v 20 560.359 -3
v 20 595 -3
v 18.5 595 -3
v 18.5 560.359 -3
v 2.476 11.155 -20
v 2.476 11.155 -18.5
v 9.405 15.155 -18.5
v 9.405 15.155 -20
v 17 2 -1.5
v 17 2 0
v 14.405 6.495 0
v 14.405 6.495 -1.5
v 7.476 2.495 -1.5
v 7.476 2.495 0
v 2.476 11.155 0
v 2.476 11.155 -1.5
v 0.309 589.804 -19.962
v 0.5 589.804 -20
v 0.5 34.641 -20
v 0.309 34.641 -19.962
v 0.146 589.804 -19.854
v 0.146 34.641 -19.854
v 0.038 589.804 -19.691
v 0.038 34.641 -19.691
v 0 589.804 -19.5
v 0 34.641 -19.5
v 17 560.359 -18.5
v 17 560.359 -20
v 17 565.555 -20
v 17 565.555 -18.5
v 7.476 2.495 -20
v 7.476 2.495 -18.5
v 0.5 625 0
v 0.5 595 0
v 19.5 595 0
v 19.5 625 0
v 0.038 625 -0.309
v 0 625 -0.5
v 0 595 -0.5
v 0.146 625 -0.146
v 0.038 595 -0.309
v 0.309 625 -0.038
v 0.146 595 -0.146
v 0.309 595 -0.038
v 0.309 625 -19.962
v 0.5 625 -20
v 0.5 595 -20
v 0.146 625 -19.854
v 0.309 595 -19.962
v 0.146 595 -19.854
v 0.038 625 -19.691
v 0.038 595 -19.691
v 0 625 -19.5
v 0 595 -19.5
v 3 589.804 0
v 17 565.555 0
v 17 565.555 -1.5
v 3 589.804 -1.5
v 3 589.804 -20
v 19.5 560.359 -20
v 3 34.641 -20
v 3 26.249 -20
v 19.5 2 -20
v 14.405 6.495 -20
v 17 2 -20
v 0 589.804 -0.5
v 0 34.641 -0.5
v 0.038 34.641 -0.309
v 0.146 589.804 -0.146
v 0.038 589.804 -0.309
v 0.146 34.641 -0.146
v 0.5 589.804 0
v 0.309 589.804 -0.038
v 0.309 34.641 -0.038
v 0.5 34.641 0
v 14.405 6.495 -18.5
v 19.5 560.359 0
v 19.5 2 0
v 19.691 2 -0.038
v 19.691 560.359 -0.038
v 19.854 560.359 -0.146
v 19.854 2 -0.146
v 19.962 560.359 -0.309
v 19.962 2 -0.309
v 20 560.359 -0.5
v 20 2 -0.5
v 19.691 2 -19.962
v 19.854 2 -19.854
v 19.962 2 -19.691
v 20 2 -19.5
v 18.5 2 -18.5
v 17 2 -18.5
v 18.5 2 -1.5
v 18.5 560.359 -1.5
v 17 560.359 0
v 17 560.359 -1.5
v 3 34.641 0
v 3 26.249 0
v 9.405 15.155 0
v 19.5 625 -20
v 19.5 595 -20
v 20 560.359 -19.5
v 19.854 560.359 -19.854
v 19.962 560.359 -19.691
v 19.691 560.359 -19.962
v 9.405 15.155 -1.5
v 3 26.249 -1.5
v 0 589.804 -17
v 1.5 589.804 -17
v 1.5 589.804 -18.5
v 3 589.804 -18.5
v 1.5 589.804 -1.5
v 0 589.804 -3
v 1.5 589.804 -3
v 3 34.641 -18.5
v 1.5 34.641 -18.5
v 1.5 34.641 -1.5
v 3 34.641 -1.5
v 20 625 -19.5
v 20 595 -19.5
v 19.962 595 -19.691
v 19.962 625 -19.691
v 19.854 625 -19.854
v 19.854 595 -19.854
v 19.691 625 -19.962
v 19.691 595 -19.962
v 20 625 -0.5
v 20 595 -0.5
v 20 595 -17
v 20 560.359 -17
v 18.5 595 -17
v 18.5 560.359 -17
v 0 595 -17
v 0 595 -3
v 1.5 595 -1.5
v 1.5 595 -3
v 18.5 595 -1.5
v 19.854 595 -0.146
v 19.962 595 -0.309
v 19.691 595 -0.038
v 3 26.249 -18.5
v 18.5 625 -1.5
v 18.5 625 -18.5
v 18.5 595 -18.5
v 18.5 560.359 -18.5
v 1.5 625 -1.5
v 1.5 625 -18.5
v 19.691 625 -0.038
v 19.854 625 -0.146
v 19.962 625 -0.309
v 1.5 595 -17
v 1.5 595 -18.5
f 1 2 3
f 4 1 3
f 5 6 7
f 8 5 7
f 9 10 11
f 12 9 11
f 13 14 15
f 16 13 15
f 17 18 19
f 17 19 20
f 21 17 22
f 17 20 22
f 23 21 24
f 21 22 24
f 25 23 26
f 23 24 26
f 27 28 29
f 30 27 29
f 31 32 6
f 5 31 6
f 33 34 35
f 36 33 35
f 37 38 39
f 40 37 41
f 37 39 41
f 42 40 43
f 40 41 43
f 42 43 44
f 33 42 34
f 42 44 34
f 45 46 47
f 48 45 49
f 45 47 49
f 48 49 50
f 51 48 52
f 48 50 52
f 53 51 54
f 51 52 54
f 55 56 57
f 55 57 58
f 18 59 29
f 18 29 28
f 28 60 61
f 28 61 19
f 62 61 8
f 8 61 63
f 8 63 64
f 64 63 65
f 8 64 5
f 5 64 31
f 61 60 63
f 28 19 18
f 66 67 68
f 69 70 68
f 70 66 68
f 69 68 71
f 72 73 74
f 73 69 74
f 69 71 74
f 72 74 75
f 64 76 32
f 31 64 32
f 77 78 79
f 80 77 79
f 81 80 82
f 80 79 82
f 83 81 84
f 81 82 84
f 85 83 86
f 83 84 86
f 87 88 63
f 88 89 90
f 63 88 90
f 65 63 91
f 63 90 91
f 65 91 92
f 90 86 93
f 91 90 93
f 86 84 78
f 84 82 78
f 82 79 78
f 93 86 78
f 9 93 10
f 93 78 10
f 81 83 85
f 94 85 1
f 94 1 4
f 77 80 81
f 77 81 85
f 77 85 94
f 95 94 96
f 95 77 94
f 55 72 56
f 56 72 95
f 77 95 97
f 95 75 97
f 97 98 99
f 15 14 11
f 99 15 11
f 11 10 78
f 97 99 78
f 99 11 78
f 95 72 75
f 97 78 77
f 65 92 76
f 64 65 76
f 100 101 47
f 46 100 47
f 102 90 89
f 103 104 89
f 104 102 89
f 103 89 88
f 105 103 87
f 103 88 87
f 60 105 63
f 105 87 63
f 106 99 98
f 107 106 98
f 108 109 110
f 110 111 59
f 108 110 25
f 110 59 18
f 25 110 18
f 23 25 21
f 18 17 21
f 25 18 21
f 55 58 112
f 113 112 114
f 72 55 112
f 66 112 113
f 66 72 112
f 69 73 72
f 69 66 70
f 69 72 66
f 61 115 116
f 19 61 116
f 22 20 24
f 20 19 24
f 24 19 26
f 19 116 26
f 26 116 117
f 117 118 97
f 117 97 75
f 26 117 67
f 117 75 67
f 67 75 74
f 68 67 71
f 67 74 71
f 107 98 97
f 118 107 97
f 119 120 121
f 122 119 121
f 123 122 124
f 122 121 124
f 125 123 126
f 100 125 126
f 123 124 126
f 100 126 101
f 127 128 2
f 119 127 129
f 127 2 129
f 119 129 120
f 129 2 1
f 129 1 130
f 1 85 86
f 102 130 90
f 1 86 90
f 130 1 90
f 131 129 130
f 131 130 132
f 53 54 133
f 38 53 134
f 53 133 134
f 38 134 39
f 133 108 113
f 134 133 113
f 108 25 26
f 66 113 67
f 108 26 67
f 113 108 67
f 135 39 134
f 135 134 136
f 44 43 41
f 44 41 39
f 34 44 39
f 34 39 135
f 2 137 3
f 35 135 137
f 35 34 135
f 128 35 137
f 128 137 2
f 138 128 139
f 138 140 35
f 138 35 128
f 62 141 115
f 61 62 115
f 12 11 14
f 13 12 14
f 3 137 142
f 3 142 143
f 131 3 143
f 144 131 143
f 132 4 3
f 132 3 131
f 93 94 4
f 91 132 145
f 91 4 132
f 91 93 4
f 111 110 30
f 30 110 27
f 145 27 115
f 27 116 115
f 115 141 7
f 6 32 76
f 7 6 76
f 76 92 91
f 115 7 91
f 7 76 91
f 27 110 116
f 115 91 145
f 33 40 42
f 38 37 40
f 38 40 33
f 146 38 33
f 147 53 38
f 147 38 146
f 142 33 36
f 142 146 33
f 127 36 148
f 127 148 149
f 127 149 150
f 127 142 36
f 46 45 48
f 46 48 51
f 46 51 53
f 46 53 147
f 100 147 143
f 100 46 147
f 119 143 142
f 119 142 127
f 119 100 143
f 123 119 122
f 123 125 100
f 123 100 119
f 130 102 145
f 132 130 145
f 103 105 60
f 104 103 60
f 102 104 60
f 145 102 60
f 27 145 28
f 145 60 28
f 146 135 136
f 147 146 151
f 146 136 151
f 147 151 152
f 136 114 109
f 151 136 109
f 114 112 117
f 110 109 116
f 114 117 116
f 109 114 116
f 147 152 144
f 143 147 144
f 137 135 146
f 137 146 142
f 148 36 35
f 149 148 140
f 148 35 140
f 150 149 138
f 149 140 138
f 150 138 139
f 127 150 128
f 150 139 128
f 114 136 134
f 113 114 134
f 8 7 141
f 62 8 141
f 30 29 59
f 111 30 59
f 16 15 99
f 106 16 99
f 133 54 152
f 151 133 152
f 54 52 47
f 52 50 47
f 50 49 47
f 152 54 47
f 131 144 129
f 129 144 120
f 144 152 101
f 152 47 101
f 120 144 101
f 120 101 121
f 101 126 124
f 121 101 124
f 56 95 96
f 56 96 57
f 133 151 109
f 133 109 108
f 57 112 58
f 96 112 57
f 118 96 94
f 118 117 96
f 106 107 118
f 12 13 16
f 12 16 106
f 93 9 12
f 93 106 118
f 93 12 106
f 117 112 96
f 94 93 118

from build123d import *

# Parameters (mm, degrees)
SKETCH1_W           = 17
SKETCH1_H           = 17
BOSS_EXTRUDE1_DEPTH = 625
CUT_EXTRUDE1_DEPTH  = 626.639672655
CUT_EXTRUDE9_DEPTH  = 3


with BuildPart() as part:
    # Sketch1 → Boss-Extrude1 (new body)
    with BuildSketch(Plane(origin=(0, 0, 0), x_dir=(1, 0, 0), z_dir=(0, 1, 0))):
        with BuildLine():
            Line((0.5, 0), (19.5, 0))
            ThreePointArc((19.5, 0), (19.853553391, 0.146446609), (20, 0.5))
            Line((20, 0.5), (20, 19.5))
            ThreePointArc((20, 19.5), (19.853553391, 19.853553391), (19.5, 20))
            Line((19.5, 20), (0.5, 20))
            ThreePointArc((0.5, 20), (0.146446609, 19.853553391), (0, 19.5))
            Line((0, 19.5), (0, 0.5))
            ThreePointArc((0, 0.5), (0.146446609, 0.146446609), (0.5, 0))
        make_face()
        with Locations((10, 10)):
            Rectangle(SKETCH1_W, SKETCH1_H, mode=Mode.SUBTRACT)
    extrude(amount=BOSS_EXTRUDE1_DEPTH)

    # Sketch2 → Cut-Extrude1 (cut, through all)
    with BuildSketch(Plane.XY):
        Polygon((9.404700538, 15.155444566), (3, 26.248711306), (3, 34.641016151), (0, 34.641016151), (0, 0), (20, 0), (20, 2), (17, 2), (14.404700538, 6.495190528), (7.476497308, 2.495190528), (2.476497308, 11.155444566), align=None)
    extrude(amount=-CUT_EXTRUDE1_DEPTH, mode=Mode.SUBTRACT)

    # Sketch4 → Cut-Extrude9 (cut)
    with BuildSketch(Plane.XY):
        Polygon((20, 595), (20, 560.358983849), (17, 560.358983849), (17, 565.555136271), (3, 589.803847577), (0, 589.803847577), (0, 595), align=None)
    cut_extrude9 = extrude(amount=-CUT_EXTRUDE9_DEPTH, mode=Mode.SUBTRACT)

    # Mirror2: Cut-Extrude9 across plane
    add(cut_extrude9.mirror(Plane.XY.offset(-10)), mode=Mode.SUBTRACT)


solid = part.part
